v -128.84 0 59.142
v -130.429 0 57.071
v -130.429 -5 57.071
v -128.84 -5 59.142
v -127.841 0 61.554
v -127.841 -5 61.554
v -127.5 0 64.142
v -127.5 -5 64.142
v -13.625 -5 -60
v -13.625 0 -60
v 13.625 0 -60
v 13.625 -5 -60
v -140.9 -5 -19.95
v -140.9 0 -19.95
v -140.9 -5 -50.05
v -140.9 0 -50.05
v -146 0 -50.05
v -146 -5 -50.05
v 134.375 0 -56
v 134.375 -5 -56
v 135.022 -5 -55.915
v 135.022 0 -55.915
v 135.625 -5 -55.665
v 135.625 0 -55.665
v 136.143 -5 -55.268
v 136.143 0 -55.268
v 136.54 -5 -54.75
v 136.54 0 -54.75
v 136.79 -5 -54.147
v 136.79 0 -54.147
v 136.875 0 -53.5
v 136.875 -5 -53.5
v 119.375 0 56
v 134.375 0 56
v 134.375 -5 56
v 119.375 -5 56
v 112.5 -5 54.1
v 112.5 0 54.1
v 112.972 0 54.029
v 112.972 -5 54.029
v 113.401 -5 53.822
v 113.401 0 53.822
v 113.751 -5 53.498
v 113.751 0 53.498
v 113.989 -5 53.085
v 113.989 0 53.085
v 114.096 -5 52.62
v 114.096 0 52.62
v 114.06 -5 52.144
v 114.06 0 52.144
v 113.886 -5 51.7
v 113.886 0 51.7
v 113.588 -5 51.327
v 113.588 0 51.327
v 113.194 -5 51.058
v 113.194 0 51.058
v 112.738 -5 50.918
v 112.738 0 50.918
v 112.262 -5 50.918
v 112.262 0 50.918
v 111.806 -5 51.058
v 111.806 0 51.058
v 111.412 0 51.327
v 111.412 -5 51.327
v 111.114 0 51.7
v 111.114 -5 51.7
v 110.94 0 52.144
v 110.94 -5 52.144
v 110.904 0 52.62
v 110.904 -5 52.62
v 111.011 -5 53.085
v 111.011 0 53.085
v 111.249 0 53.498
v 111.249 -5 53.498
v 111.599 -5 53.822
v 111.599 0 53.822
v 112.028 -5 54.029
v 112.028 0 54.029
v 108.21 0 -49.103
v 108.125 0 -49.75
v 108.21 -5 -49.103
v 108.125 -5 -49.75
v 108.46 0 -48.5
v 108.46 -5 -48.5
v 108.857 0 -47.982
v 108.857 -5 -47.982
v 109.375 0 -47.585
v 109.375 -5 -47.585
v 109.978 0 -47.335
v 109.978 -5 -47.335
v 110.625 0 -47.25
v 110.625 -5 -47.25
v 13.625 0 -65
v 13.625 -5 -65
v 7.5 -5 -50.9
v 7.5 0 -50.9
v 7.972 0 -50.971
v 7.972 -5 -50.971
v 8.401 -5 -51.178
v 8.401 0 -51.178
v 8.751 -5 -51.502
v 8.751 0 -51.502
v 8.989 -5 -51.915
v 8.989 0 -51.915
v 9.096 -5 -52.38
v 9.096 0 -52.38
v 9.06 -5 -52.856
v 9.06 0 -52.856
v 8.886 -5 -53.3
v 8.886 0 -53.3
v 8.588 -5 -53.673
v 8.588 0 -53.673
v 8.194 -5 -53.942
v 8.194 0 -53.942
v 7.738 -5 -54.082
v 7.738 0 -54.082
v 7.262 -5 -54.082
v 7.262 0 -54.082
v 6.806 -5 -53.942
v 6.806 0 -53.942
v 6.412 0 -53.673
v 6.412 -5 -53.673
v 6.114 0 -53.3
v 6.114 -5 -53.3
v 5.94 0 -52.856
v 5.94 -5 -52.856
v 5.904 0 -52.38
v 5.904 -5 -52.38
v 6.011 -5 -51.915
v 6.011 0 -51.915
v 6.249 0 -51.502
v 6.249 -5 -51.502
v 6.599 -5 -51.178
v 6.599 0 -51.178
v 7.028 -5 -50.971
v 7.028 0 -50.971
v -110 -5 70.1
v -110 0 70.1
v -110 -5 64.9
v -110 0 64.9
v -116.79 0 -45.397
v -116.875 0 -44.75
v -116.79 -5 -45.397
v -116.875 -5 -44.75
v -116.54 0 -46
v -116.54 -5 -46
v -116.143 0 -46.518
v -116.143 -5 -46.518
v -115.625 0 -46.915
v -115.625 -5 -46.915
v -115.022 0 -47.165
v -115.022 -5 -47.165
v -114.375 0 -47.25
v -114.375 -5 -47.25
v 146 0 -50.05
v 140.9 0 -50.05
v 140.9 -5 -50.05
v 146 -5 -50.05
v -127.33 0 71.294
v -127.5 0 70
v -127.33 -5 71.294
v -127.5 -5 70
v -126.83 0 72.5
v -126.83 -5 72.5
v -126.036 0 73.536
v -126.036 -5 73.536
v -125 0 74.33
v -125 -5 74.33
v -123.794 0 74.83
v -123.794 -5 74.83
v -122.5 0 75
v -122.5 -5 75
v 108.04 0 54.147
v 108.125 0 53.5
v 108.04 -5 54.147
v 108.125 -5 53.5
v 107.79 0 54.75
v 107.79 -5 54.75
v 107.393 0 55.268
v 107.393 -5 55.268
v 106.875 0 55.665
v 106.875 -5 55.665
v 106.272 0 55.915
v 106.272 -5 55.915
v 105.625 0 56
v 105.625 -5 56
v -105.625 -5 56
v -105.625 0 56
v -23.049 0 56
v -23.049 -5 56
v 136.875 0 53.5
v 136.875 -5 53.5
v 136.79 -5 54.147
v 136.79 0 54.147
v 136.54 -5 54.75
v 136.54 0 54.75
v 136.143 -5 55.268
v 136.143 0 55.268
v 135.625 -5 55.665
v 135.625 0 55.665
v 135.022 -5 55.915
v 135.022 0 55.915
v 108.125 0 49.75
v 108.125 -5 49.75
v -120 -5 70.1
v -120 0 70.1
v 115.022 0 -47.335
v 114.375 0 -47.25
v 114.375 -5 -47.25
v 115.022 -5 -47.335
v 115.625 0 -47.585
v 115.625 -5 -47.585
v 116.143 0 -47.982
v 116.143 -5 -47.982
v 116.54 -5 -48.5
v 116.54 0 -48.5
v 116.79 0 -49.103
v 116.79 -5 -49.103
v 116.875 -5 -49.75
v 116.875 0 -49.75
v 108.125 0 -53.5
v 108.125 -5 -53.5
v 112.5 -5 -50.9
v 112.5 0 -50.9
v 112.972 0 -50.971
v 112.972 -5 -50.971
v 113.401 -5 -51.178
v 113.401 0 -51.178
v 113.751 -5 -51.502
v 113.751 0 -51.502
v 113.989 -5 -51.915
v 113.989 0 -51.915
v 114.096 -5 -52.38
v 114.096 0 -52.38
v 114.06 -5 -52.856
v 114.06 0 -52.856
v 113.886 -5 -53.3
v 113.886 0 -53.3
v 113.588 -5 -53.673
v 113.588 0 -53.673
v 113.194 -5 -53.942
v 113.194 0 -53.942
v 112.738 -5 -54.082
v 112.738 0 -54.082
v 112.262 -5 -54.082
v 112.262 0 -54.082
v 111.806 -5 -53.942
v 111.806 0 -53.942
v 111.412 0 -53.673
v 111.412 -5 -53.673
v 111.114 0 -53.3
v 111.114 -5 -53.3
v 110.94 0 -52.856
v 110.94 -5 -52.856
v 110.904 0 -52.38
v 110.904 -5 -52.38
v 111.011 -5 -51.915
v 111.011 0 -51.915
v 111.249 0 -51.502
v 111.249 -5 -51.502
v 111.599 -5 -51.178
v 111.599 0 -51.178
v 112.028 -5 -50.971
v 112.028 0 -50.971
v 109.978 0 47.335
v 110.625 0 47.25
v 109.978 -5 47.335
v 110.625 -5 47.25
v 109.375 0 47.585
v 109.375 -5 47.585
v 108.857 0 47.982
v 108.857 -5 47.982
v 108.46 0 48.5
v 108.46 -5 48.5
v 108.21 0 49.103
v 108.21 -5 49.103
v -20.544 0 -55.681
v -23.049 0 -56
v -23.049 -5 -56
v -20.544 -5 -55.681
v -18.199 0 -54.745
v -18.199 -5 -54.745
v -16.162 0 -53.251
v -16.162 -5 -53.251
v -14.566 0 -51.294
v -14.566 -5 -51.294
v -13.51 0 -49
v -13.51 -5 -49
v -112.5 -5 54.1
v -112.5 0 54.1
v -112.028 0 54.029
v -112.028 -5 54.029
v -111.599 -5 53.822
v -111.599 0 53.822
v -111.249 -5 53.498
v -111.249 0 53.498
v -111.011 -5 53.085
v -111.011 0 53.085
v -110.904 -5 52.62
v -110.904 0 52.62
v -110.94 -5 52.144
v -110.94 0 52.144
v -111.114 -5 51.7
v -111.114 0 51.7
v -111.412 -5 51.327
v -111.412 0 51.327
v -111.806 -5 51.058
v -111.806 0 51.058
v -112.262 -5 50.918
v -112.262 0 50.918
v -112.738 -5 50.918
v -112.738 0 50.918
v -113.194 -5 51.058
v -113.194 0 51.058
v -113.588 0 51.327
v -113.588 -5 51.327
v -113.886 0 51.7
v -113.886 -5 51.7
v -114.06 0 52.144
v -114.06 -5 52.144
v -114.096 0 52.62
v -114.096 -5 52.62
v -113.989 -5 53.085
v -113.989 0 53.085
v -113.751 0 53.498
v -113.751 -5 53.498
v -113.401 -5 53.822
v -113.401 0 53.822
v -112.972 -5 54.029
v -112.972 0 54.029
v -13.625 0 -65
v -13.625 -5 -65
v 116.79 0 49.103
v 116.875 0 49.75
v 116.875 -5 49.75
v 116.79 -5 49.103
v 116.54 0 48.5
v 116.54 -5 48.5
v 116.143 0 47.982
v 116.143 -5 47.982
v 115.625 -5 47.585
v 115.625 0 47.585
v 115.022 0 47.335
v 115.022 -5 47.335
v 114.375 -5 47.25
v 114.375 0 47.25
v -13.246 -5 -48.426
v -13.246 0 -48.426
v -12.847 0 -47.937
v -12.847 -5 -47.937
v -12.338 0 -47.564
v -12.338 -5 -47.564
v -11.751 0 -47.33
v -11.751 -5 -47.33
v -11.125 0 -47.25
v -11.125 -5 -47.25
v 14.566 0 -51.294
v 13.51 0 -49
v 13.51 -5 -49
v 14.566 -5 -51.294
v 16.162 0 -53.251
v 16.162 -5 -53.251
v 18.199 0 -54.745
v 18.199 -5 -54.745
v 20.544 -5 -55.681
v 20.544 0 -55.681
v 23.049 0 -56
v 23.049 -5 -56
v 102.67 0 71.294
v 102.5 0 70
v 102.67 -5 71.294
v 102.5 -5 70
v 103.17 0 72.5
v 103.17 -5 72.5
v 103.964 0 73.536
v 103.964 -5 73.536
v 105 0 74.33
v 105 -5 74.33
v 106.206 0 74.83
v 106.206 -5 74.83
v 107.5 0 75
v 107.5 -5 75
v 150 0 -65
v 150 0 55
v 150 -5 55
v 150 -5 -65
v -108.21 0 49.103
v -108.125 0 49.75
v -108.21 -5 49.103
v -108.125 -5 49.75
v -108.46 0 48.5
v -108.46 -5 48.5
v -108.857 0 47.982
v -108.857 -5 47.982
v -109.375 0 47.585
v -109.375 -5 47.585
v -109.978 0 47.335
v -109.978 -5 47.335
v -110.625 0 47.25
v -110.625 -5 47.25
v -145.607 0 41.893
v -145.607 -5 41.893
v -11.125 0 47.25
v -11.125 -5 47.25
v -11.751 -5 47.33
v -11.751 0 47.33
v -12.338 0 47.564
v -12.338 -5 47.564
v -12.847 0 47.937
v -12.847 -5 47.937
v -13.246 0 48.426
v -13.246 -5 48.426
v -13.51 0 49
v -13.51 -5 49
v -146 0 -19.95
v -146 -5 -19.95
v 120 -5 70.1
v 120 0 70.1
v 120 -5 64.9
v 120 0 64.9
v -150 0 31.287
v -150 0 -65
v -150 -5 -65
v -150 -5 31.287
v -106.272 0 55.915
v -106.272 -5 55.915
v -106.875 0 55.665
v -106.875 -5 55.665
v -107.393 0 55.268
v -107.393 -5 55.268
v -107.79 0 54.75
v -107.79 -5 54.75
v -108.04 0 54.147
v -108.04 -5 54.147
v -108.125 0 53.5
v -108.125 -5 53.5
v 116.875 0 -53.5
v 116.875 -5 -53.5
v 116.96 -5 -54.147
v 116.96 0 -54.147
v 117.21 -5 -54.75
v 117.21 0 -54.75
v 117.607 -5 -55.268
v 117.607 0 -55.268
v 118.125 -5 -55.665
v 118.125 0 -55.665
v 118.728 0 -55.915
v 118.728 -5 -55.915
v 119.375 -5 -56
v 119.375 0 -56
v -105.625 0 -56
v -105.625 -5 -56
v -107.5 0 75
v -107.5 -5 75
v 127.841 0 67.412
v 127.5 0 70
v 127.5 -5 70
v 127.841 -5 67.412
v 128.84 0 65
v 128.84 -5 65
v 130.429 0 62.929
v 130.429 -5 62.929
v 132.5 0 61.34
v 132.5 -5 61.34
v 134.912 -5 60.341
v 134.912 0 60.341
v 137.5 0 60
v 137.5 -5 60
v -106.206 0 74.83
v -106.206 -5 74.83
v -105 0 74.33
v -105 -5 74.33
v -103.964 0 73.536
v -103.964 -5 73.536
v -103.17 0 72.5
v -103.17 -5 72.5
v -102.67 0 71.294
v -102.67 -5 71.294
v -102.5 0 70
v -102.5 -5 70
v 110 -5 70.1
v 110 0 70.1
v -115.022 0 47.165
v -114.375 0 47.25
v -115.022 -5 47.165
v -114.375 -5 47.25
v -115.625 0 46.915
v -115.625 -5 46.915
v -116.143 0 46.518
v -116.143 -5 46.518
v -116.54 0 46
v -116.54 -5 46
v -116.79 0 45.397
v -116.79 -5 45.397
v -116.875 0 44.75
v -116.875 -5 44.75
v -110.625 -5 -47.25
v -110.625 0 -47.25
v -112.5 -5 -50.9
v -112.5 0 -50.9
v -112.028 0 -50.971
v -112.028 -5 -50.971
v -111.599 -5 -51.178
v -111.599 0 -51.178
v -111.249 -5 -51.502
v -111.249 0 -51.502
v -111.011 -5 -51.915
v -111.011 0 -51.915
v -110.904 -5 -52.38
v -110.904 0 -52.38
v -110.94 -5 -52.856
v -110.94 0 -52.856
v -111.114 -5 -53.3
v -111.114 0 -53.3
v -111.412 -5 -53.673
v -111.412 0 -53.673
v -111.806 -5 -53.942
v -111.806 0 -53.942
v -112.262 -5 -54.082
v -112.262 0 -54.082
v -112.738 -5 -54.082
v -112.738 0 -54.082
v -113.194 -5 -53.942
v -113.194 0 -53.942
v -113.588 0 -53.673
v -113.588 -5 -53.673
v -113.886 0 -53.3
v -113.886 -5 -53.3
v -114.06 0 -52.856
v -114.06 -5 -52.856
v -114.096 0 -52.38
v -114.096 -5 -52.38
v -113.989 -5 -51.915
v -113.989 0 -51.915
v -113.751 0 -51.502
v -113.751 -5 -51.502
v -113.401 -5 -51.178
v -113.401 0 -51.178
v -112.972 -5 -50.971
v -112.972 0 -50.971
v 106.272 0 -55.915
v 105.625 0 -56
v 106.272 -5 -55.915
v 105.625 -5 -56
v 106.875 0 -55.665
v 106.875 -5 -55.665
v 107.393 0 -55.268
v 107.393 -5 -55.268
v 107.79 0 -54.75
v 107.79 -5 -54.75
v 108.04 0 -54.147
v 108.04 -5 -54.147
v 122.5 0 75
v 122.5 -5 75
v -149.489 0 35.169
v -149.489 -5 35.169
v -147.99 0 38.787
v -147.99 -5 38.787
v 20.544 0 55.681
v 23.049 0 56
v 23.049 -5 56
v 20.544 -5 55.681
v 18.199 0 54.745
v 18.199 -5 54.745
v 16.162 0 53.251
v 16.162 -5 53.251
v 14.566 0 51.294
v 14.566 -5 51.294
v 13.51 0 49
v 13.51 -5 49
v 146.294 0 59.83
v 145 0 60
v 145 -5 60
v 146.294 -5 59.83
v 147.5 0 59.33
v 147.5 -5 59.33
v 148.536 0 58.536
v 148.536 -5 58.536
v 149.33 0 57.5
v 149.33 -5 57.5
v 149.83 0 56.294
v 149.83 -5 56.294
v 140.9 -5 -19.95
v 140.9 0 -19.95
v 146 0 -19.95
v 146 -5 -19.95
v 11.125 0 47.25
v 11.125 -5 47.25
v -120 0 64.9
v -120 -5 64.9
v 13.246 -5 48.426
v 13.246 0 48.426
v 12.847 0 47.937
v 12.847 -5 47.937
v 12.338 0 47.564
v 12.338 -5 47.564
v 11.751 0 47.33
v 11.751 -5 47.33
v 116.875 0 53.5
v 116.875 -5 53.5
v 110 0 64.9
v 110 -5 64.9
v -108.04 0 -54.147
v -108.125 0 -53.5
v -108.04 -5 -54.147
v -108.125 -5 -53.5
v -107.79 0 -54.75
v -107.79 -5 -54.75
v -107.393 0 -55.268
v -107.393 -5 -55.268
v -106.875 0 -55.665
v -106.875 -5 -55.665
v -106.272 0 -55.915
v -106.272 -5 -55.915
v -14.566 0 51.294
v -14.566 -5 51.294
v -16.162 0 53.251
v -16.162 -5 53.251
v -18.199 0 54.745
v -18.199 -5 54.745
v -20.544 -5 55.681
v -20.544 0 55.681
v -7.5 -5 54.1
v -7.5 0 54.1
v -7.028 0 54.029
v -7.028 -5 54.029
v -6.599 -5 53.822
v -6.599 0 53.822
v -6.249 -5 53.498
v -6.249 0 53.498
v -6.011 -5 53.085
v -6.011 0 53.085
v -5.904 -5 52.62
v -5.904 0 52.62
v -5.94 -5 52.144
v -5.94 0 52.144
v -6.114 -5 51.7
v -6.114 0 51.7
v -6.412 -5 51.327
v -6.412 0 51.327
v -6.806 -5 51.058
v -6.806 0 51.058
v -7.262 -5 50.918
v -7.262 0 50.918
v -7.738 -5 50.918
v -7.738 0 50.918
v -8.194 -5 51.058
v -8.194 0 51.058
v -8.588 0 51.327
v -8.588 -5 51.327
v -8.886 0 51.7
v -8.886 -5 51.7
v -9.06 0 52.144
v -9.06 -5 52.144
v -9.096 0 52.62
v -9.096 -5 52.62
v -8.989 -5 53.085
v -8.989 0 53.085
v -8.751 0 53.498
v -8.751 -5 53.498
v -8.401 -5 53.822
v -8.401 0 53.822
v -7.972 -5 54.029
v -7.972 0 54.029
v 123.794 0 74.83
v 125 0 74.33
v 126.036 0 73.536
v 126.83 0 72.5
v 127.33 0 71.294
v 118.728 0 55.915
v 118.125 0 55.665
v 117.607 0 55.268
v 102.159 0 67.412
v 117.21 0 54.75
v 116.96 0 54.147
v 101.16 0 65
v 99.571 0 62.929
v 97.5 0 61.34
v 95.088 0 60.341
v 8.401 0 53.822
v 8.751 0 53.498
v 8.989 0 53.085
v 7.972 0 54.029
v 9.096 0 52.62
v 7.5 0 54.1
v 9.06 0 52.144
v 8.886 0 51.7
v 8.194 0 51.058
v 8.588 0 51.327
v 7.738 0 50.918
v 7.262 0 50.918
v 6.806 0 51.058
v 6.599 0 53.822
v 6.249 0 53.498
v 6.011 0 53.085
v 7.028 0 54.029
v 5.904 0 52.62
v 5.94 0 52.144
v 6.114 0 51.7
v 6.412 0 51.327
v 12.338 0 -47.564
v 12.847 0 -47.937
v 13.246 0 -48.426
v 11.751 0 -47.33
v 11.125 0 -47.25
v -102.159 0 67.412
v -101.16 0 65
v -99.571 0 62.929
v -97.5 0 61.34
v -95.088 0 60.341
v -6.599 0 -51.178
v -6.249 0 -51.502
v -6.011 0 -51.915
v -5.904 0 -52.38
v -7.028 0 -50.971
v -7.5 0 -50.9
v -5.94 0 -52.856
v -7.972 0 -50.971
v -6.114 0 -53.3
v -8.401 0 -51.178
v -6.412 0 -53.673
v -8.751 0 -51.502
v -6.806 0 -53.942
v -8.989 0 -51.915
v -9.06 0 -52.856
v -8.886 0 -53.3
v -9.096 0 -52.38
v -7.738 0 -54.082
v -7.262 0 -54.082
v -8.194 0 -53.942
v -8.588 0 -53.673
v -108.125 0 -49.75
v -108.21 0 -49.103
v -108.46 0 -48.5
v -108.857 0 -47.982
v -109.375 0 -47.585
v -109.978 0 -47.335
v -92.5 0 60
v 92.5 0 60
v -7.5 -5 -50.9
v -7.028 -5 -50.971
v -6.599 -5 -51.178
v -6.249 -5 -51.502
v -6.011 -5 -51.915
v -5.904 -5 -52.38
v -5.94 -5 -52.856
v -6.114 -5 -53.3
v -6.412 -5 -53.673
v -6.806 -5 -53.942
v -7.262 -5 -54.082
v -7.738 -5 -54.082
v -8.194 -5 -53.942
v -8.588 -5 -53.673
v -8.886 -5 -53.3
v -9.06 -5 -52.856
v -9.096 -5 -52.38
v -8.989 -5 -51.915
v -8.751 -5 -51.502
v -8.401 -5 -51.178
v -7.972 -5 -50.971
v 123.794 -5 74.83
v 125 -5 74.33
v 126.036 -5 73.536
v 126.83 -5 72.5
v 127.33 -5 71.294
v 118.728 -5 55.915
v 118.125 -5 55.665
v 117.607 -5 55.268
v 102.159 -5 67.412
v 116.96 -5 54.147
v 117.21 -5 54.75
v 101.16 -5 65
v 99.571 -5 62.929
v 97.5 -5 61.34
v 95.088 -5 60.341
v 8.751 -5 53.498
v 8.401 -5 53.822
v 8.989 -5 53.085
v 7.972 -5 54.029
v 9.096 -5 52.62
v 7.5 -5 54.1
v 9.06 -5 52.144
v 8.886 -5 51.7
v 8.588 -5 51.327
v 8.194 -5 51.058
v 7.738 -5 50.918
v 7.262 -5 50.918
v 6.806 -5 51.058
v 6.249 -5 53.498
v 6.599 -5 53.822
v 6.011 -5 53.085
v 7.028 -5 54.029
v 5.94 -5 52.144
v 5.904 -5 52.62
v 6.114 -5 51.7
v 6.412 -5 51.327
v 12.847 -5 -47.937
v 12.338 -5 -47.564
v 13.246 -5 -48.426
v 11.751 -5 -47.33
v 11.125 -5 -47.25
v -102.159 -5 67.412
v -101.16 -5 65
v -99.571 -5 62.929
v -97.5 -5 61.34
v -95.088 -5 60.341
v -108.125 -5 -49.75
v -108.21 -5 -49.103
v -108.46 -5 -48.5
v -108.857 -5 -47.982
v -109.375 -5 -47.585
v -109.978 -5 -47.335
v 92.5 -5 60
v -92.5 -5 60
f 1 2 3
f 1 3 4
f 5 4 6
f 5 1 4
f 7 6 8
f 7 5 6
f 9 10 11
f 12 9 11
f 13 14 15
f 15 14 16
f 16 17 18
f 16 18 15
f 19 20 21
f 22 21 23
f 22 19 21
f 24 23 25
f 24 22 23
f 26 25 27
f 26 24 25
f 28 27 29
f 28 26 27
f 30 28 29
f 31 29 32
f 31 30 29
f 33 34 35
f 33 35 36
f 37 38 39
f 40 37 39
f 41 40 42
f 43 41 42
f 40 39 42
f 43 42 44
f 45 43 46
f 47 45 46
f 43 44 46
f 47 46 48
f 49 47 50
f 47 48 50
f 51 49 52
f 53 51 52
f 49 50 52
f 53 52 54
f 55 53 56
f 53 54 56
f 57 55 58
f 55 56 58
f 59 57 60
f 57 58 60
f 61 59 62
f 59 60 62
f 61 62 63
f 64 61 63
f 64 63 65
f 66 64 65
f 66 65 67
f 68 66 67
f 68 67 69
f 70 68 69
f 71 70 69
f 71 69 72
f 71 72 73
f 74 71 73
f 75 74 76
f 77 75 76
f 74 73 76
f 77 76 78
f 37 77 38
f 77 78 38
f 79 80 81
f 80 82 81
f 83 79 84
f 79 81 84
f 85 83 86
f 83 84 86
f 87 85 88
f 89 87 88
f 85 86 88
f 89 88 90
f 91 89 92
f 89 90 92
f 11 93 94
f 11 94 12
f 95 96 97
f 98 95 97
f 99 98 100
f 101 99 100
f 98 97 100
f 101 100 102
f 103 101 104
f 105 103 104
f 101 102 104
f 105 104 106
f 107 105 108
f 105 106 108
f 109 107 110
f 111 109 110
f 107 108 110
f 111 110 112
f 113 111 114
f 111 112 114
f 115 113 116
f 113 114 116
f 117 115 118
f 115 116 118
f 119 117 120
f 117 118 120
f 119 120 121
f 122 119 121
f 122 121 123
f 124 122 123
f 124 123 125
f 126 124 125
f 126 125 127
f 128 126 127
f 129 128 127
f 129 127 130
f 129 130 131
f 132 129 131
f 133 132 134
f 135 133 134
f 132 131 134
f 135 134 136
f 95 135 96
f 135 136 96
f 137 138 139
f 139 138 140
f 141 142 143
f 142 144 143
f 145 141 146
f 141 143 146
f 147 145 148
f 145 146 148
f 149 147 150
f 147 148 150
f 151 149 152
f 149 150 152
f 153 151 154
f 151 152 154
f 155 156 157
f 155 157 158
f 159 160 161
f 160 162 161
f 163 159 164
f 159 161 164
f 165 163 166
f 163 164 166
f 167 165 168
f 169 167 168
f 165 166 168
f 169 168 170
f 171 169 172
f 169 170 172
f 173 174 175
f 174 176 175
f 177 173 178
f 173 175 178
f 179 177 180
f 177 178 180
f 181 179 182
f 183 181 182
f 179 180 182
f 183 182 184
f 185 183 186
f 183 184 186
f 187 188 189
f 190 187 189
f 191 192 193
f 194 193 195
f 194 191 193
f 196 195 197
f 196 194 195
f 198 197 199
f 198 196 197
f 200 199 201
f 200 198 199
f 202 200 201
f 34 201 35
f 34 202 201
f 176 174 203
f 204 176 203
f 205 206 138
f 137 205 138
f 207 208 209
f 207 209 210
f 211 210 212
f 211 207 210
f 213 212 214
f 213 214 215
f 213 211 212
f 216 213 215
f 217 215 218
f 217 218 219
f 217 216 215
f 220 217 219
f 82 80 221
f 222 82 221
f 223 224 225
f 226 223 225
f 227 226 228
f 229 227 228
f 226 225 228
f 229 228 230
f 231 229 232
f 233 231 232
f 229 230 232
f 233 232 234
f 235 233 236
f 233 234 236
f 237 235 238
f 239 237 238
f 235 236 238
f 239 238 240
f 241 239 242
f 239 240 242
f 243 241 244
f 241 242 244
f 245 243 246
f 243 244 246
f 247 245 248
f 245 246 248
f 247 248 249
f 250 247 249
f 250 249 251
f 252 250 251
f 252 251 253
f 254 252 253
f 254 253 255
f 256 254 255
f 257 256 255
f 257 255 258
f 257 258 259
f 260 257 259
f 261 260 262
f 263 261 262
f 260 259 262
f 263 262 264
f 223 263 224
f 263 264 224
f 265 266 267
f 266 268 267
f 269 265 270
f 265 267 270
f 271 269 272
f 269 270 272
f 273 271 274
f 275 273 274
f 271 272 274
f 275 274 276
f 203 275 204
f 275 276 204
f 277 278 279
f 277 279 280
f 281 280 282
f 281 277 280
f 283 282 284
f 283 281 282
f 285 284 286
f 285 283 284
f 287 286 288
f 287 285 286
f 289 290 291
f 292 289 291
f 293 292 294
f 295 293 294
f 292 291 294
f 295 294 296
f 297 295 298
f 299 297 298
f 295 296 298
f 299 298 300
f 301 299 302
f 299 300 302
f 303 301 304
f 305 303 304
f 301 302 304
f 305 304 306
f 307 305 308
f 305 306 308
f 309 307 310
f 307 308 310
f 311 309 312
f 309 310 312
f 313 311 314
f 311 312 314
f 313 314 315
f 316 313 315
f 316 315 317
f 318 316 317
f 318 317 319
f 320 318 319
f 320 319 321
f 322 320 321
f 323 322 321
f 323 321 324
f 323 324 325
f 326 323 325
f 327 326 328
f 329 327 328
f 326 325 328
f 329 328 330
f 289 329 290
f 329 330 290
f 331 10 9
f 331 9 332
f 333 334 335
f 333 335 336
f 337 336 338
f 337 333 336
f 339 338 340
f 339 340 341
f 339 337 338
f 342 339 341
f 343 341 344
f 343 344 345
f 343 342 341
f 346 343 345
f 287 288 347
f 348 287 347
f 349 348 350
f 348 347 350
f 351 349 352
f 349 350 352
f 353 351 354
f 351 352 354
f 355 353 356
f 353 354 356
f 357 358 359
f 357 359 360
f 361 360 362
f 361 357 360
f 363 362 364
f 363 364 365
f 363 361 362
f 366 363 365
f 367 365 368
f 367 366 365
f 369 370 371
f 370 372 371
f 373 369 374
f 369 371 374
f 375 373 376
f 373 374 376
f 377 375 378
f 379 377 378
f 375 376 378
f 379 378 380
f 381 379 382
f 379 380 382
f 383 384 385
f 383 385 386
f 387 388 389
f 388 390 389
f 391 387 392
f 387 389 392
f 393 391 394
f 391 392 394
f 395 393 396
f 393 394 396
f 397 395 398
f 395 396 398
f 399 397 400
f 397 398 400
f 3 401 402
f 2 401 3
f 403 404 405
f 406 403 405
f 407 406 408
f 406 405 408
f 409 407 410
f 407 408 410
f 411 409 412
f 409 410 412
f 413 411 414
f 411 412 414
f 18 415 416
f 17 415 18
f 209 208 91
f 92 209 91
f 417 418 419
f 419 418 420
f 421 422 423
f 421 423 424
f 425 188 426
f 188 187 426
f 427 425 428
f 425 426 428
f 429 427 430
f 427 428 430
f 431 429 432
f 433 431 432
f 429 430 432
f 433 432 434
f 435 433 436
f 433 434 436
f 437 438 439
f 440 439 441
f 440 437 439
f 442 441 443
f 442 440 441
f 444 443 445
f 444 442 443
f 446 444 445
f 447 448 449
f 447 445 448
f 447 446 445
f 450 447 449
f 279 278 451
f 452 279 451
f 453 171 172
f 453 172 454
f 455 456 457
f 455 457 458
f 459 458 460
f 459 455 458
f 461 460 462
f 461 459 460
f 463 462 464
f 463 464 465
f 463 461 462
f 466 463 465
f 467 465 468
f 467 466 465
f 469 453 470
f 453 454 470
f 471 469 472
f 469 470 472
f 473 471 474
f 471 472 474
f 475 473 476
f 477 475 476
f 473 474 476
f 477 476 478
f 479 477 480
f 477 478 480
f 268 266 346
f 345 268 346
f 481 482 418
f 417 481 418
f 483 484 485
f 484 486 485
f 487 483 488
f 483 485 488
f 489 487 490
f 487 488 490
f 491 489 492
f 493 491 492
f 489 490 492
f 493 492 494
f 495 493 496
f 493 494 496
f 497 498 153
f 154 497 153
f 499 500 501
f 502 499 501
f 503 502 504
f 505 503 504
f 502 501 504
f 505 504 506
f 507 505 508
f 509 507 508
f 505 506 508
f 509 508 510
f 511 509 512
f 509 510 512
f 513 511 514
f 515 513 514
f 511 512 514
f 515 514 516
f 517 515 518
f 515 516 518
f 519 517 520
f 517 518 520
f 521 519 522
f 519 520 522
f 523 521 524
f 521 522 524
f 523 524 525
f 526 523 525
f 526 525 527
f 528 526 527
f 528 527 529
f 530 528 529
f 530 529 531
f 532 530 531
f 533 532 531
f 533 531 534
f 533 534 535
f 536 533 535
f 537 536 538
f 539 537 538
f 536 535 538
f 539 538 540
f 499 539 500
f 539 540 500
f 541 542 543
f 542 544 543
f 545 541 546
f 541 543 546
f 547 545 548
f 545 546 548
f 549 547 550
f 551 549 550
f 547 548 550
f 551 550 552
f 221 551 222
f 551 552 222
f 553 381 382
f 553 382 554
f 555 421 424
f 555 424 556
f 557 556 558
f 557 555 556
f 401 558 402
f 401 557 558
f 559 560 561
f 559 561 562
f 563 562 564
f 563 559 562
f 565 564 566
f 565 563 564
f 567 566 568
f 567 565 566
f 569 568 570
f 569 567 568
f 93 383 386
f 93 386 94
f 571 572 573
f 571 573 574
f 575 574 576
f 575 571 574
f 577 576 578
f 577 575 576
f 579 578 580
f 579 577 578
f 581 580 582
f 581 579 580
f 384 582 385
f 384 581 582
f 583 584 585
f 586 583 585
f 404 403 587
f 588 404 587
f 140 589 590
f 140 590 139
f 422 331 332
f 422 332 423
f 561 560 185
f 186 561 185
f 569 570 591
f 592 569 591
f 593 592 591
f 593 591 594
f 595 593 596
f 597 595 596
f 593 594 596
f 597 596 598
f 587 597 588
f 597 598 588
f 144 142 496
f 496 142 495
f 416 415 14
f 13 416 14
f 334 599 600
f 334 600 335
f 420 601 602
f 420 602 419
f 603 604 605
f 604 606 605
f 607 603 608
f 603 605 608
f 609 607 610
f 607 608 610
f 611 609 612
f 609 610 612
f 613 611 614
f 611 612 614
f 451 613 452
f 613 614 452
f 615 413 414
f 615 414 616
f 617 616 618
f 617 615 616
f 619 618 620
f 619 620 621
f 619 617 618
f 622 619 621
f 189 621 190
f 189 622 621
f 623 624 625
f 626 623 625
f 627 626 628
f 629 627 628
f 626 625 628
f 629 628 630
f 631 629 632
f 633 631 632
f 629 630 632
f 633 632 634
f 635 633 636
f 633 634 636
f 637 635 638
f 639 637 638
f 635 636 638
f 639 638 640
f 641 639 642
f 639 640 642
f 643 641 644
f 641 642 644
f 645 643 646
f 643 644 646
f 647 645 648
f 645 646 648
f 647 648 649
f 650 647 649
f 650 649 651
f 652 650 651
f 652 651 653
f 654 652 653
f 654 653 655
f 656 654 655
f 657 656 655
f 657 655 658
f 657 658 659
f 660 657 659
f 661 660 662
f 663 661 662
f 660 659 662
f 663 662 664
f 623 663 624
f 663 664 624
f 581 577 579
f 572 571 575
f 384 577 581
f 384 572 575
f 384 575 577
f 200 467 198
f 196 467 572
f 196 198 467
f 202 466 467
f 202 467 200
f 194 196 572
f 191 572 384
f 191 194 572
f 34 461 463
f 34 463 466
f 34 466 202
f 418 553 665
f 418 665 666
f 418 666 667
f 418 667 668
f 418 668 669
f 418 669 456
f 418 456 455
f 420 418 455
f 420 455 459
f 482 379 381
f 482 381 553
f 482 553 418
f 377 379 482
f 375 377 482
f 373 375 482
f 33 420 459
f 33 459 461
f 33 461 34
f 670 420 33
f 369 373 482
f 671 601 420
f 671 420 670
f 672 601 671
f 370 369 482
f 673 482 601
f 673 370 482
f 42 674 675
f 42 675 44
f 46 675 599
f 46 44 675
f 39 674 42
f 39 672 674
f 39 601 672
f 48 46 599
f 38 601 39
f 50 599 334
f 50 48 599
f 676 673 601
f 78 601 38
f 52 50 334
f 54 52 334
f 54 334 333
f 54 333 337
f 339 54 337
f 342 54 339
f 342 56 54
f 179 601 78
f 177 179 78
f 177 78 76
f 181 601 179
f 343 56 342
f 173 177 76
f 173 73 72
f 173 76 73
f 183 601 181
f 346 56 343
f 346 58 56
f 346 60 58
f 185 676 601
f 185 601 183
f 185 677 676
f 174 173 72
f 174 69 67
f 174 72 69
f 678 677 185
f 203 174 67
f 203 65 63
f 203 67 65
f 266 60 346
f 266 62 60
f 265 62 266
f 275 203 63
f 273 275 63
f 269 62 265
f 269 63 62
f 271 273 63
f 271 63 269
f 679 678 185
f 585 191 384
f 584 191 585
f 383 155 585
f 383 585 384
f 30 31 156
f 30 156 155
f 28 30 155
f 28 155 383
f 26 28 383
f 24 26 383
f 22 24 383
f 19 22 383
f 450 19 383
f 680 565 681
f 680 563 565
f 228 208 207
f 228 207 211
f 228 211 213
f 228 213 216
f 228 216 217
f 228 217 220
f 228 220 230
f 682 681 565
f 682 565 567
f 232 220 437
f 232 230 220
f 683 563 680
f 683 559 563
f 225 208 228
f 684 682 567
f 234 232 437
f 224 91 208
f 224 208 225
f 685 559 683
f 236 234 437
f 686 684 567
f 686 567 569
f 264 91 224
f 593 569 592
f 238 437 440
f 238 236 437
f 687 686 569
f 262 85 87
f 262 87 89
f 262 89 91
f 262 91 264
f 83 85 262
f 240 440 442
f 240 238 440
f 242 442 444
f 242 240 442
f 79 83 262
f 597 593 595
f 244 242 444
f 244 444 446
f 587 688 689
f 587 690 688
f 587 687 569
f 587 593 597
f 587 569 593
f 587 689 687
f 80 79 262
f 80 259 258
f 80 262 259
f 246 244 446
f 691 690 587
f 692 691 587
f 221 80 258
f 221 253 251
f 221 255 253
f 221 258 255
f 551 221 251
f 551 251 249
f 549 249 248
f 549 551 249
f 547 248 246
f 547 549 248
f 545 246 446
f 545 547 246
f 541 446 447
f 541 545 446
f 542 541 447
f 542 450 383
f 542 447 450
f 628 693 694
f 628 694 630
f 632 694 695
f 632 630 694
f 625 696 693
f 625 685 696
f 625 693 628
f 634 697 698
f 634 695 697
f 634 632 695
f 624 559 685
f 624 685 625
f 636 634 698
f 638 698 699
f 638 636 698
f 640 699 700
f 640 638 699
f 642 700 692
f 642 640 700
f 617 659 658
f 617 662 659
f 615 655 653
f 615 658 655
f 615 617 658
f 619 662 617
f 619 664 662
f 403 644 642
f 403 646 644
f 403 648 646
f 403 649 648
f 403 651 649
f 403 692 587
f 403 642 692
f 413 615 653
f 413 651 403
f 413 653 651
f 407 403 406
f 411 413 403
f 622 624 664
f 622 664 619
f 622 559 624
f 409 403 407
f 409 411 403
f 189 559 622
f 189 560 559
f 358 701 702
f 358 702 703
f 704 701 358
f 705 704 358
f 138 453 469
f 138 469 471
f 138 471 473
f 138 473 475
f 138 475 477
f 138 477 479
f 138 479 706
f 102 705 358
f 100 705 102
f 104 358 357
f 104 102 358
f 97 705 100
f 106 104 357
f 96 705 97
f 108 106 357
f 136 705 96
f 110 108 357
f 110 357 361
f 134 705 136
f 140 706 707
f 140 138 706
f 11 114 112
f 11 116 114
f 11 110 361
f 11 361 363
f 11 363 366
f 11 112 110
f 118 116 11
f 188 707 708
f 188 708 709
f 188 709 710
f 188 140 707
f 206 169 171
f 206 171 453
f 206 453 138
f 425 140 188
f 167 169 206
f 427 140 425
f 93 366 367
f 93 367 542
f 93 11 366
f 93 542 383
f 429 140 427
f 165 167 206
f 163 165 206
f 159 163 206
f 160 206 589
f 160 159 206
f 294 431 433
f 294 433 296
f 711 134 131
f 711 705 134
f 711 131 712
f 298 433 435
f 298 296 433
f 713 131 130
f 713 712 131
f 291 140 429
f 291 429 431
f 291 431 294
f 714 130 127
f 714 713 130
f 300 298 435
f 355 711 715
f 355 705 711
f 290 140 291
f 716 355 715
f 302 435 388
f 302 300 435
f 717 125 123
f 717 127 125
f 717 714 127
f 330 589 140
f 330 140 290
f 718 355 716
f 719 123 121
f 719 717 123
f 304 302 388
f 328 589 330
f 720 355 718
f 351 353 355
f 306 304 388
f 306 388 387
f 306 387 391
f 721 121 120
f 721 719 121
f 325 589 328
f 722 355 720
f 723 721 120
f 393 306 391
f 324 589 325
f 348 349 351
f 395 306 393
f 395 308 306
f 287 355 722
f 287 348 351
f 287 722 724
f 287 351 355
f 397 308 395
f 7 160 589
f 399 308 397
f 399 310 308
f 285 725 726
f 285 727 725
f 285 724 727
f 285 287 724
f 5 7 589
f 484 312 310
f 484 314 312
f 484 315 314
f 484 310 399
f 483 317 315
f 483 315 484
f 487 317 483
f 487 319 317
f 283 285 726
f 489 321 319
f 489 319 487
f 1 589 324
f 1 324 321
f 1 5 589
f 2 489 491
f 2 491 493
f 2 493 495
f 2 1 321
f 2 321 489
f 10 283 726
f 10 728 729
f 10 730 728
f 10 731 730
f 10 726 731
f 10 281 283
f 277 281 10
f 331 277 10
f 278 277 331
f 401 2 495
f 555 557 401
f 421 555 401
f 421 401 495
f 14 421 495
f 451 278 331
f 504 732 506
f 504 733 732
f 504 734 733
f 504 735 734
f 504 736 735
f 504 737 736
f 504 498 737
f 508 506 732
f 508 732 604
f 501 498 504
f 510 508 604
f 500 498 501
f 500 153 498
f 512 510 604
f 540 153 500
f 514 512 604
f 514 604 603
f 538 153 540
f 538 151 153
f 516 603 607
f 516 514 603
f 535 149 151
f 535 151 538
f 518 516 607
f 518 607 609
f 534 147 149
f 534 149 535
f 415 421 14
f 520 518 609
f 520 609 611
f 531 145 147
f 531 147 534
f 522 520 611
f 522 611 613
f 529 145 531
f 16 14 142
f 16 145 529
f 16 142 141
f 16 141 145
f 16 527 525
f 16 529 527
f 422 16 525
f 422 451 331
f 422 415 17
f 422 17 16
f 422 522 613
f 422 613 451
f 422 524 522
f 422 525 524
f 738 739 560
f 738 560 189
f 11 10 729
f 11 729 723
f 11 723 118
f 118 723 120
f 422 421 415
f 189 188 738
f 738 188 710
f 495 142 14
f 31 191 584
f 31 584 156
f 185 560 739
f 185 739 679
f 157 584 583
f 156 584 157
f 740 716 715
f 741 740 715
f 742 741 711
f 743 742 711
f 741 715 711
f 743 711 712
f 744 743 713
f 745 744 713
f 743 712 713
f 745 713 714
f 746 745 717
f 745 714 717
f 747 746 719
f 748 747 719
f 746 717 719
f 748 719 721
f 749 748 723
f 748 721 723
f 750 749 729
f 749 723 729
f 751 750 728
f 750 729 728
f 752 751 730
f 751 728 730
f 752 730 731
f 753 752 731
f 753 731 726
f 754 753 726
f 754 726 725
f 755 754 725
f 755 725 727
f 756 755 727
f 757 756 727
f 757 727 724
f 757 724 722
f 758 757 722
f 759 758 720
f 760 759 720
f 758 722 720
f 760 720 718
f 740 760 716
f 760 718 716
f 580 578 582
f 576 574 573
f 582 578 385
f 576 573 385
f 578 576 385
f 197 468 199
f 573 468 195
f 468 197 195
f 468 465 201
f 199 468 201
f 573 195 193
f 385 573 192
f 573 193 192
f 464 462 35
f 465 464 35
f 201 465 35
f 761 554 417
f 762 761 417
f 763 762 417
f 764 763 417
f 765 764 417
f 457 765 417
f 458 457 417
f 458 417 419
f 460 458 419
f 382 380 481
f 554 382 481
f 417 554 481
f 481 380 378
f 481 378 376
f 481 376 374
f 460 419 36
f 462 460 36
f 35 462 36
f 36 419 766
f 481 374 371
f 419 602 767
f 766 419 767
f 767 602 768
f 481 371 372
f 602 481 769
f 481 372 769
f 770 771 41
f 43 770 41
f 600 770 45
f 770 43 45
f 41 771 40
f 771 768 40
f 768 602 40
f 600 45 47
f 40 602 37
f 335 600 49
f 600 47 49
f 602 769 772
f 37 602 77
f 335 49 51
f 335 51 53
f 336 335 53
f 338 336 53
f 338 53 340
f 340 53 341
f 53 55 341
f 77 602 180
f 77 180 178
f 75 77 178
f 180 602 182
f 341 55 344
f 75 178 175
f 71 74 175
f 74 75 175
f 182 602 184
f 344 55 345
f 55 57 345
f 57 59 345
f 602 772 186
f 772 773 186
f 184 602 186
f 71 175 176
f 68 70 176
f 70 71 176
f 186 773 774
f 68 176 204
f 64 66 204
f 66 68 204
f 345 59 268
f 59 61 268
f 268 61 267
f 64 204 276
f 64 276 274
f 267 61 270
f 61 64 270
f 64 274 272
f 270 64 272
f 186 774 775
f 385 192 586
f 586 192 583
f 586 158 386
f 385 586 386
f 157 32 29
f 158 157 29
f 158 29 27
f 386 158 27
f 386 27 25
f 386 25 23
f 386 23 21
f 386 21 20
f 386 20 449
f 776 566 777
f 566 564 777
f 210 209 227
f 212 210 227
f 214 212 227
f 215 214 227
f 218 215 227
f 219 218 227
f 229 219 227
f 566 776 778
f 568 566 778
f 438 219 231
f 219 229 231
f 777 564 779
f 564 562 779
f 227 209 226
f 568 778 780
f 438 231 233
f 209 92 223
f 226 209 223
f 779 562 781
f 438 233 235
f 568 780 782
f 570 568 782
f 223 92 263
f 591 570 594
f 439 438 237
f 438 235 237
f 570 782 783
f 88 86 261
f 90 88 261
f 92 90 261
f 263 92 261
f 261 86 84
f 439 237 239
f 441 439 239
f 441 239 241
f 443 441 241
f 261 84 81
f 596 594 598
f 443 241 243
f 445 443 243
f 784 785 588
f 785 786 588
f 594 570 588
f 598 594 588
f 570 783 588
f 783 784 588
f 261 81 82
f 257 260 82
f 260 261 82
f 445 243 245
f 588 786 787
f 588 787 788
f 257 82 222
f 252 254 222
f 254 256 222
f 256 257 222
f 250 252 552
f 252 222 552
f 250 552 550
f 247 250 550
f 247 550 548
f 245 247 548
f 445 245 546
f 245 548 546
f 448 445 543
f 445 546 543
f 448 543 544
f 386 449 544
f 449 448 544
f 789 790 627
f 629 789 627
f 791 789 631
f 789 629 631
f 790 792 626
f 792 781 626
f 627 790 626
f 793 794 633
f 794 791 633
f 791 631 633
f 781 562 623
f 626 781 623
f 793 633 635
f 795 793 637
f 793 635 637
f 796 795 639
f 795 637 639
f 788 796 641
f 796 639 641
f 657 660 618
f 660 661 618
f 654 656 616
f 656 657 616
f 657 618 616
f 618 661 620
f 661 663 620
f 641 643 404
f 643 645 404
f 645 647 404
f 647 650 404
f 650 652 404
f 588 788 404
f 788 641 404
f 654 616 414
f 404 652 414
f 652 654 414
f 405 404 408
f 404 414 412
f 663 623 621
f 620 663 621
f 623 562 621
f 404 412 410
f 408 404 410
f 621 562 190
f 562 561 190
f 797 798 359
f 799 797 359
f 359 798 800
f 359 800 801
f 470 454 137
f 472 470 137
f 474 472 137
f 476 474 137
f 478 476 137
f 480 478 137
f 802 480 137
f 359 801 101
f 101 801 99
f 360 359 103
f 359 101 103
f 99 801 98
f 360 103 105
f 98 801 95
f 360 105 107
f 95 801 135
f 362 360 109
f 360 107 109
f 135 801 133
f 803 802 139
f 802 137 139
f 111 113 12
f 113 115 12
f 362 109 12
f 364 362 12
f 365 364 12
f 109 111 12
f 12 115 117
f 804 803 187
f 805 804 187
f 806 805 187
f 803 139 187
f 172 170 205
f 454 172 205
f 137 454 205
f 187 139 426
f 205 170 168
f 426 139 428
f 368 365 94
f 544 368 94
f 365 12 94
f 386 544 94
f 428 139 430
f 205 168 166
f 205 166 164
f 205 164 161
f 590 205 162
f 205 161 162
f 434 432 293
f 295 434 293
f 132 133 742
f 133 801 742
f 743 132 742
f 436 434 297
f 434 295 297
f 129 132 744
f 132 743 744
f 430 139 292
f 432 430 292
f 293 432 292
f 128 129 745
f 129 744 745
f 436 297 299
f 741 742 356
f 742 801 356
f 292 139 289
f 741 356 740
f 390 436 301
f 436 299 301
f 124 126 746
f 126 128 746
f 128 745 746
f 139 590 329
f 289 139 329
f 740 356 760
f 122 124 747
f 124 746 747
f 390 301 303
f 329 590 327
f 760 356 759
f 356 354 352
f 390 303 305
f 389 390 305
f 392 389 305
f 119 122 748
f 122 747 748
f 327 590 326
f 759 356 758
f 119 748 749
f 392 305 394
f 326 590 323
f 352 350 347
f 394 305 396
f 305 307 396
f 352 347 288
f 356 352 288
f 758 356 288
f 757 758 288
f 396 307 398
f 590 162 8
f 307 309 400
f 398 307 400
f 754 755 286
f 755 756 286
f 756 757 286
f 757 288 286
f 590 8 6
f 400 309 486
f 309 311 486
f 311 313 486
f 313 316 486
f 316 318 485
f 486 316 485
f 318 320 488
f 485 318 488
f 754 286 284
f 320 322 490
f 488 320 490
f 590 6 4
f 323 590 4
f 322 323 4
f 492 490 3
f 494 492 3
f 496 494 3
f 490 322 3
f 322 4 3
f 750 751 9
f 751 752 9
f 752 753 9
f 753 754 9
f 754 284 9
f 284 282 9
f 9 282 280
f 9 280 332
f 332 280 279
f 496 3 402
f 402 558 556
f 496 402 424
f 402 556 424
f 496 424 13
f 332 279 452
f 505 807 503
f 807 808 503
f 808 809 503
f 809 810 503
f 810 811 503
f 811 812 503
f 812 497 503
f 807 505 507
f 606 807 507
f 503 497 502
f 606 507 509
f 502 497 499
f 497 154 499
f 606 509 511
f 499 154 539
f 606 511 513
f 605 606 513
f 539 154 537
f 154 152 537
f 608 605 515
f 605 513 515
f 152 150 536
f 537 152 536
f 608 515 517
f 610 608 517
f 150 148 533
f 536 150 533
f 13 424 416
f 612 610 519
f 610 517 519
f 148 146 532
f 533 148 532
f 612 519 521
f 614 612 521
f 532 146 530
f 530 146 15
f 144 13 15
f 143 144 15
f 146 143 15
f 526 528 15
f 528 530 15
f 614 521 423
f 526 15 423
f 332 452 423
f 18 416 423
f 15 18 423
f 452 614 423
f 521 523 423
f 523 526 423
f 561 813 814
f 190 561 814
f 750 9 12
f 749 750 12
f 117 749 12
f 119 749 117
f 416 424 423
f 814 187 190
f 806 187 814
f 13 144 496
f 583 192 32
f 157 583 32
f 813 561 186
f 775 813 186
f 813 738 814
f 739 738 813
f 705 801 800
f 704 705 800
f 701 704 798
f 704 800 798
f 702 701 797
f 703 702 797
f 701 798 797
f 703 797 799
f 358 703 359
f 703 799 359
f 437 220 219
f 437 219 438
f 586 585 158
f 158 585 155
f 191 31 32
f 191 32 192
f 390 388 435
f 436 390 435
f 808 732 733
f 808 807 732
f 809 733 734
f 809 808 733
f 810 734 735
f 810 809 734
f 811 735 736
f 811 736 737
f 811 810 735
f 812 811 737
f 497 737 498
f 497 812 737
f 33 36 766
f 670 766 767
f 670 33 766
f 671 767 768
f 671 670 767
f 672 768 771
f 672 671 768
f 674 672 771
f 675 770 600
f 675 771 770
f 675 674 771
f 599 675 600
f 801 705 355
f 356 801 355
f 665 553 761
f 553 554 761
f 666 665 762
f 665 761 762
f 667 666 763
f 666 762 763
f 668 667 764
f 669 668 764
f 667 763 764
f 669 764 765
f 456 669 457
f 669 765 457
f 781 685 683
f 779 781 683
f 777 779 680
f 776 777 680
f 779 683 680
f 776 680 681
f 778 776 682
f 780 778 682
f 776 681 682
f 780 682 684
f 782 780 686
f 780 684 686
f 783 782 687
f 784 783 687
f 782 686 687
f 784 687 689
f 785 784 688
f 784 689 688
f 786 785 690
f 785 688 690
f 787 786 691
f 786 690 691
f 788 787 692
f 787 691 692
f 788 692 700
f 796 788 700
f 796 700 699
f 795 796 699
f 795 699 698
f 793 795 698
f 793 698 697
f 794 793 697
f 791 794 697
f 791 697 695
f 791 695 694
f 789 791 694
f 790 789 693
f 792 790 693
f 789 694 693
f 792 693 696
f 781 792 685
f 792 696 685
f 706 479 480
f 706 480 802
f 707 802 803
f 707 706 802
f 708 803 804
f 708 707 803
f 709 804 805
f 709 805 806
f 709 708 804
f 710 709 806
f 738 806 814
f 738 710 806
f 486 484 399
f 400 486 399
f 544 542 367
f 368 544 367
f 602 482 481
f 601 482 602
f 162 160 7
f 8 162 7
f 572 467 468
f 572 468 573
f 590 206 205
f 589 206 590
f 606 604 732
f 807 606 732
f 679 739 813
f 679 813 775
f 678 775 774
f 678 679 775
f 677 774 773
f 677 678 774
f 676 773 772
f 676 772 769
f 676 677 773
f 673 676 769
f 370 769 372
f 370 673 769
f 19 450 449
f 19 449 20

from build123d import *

# Parameters (mm, degrees)
SKETCH1_W           = 255
SKETCH1_H           = 120
SKETCH1_R           = 1.6
BASE_FLANGE1_DEPTH  = 5
CUT_EXTRUDE1_REACH  = 143.001
SKETCH9_W           = 5.1
SKETCH9_H           = 30.1
BOSS_EXTRUDE1_DEPTH = 5
SKETCH10_W          = 25
SKETCH10_H          = 15
SKETCH10_W_2        = 10
SKETCH10_H_2        = 5.2
BOSS_EXTRUDE2_DEPTH = 5
FILLET1_R           = 5
FILLET2_R           = 2.5
FILLET3_R           = 10
CUT_EXTRUDE2_DEPTH  = 168.779617356


# Sheet-metal steps are written as plain solids
with BuildPart() as part:
    # Sketch1 → Base-Flange1 (new body)
    with BuildSketch(Plane(origin=(0, 0, 0), x_dir=(1, 0, 0), z_dir=(0, 1, 0))):
        Rectangle(SKETCH1_W, SKETCH1_H)
        with Locations(Location((-112.5, 52.5, 0), (0, 0, 270))):
            Circle(SKETCH1_R, mode=Mode.SUBTRACT)
        with Locations(Location((-112.5, -52.5, 0), (0, 0, 270))):
            Circle(SKETCH1_R, mode=Mode.SUBTRACT)
        with Locations(Location((-7.5, -52.5, 0), (0, 0, 270))):
            Circle(SKETCH1_R, mode=Mode.SUBTRACT)
        with Locations(Location((-7.5, 52.5, 0), (0, 0, 270))):
            Circle(SKETCH1_R, mode=Mode.SUBTRACT)
        with Locations(Location((7.5, 52.5, 0), (0, 0, 270))):
            Circle(SKETCH1_R, mode=Mode.SUBTRACT)
        with Locations(Location((112.5, 52.5, 0), (0, 0, 270))):
            Circle(SKETCH1_R, mode=Mode.SUBTRACT)
        with Locations(Location((112.5, -52.5, 0), (0, 0, 270))):
            Circle(SKETCH1_R, mode=Mode.SUBTRACT)
        with Locations(Location((7.5, -52.5, 0), (0, 0, 270))):
            Circle(SKETCH1_R, mode=Mode.SUBTRACT)
    extrude(amount=-BASE_FLANGE1_DEPTH)

    # Sketch6 → Cut-Extrude1 (cut, up to next)
    with BuildSketch(Plane(origin=(0, 0, 0), x_dir=(1, 0, 0), z_dir=(0, 1, 0)), mode=Mode.PRIVATE) as cut_extrude1_sk1:
        Polygon((-108.125, 56), (-108.125, 47.25), (-116.875, 47.25), (-116.875, -47.25), (-108.125, -47.25), (-108.125, -56), (-13.625, -56), (-13.625, -47.25), (13.625, -47.25), (13.625, -56), (108.125, -56), (108.125, -47.25), (116.875, -47.25), (116.875, 47.25), (108.125, 47.25), (108.125, 56), (13.625, 56), (13.625, 47.25), (-13.625, 47.25), (-13.625, 56), align=None)
    cut_extrude1_tool1 = extrude(cut_extrude1_sk1.sketch, amount=-CUT_EXTRUDE1_REACH, mode=Mode.PRIVATE) & part.part
    add(cut_extrude1_tool1.solids().sort_by_distance((0, 0, 0))[0], mode=Mode.SUBTRACT)

    # Sketch9 → Boss-Extrude1 (add)
    # profile 1 of 2: a face of its own
    with BuildSketch(Plane(origin=(0, 0, 0), x_dir=(1, 0, 0), z_dir=(0, 1, 0))):
        with BuildLine():
            Line((-150, 60), (-150, -31.286796564))
            ThreePointArc((-150, -31.286796564), (-148.858192988, -37.02704805), (-145.606601718, -41.893398282))
            Line((-145.606601718, -41.893398282), (-127.5, -60))
            Line((-127.5, -60), (-127.5, 60))
            Line((-127.5, 60), (-13.625, 60))
            Line((-13.625, 60), (-13.625, 65))
            Line((-13.625, 65), (-150, 65))
            Line((-150, 65), (-150, 60))
        make_face()
        with Locations((-143.45, 35)):
            Rectangle(SKETCH9_W, SKETCH9_H, mode=Mode.SUBTRACT)
    # profile 2 of 2: a face of its own
    with BuildSketch(Plane(origin=(0, 0, 0), x_dir=(1, 0, 0), z_dir=(0, 1, 0))):
        with BuildLine():
            Line((127.5, 60), (127.5, -60))
            Line((127.5, -60), (145, -60))
            ThreePointArc((145, -60), (148.535533906, -58.535533906), (150, -55))
            Line((150, -55), (150, 60))
            Line((150, 60), (150, 65))
            Line((150, 65), (13.625, 65))
            Line((13.625, 65), (13.625, 60))
            Line((13.625, 60), (127.5, 60))
        make_face()
        with Locations((143.45, 35)):
            Rectangle(SKETCH9_W, SKETCH9_H, mode=Mode.SUBTRACT)
    extrude(amount=-BOSS_EXTRUDE1_DEPTH)

    # Sketch10 → Boss-Extrude2 (add)
    # profile 1 of 2: a face of its own
    with BuildSketch(Plane(origin=(0, 0, 0), x_dir=(1, 0, 0), z_dir=(0, 1, 0))):
        with Locations((115, -67.5)):
            Rectangle(SKETCH10_W, SKETCH10_H)
        with Locations((115, -67.5)):
            Rectangle(SKETCH10_W_2, SKETCH10_H_2, mode=Mode.SUBTRACT)
    # profile 2 of 2: a face of its own
    with BuildSketch(Plane(origin=(0, 0, 0), x_dir=(1, 0, 0), z_dir=(0, 1, 0))):
        with Locations((-115, -67.5)):
            Rectangle(SKETCH10_W, SKETCH10_H)
        with Locations((-115, -67.5)):
            Rectangle(SKETCH10_W_2, SKETCH10_H_2, mode=Mode.SUBTRACT)
    extrude(amount=-BOSS_EXTRUDE2_DEPTH)

    # Fillet1
    fillet1_edges = [part.edges().sort_by_distance(p)[0] for p in [
        (102.5, -2.5, 75),
        (127.5, -2.5, 75),
        (-127.5, -2.5, 75),
        (-102.5, -2.5, 75),
    ]]
    fillet(fillet1_edges, radius=FILLET1_R)

    # Fillet2
    fillet2_edges = [part.edges().sort_by_distance(p)[0] for p in [
        (-108.125, -2.5, -56),
        (-13.625, -2.5, -47.25),
        (13.625, -2.5, -47.25),
        (108.125, -2.5, -56),
        (108.125, -2.5, -47.25),
        (116.875, -2.5, -47.25),
        (116.875, -2.5, 47.25),
        (108.125, -2.5, 47.25),
        (108.125, -2.5, 56),
        (13.625, -2.5, 47.25),
        (-13.625, -2.5, 47.25),
        (-108.125, -2.5, 56),
        (-108.125, -2.5, 47.25),
        (-116.875, -2.5, 47.25),
        (-116.875, -2.5, -47.25),
        (-108.125, -2.5, -47.25),
    ]]
    fillet(fillet2_edges, radius=FILLET2_R)

    # Fillet3
    # the kernel refuses this fillet: 10 mm, written as the material it adds along each edge
    with BuildSketch(Plane(origin=(127.5, 0, 60), x_dir=(0, 0, 1), z_dir=(0, -1, 0))) as fillet3_piece_1:
        with BuildLine():
            CenterArc((FILLET3_R, -FILLET3_R), FILLET3_R, 90, 90)
            Line((0, -FILLET3_R), (0, 0))
            Line((0, 0), (FILLET3_R, 0))
        make_face()
    extrude(amount=5)
    with BuildSketch(Plane(origin=(102.5, 0, 60), x_dir=(0, 0, 1), z_dir=(0, -1, 0)), Plane(origin=(-102.5, 0, 60), x_dir=(1, 0, 0), z_dir=(0, -1, 0))) as fillet3_piece_2:
        with BuildLine():
            CenterArc((FILLET3_R, FILLET3_R), FILLET3_R, 180, 90)
            Line((0, FILLET3_R), (0, 0))
            Line((0, 0), (FILLET3_R, 0))
        make_face()
    extrude(amount=5)
    with BuildSketch(Plane(origin=(-13.625, 0, -56), x_dir=(-1, 0, 0), z_dir=(0, -1, 0))) as fillet3_piece_3:
        with BuildLine():
            CenterArc((9.424240018, -10), FILLET3_R, 90, 72.542396876)
            Line((-0.115151996, -7), (-1.069091198, -6.7))
            ThreePointArc((-1.069091198, -6.7), (-1, -6.25), (-1, 0))
            Line((-1, 0), (0, 1))
            Line((0, 1), (9.424240018, 1))
            Line((9.424240018, 1), (9.424240018, 0))
        make_face()
    extrude(amount=5)
    with BuildSketch(Plane(origin=(13.625, 0, -56), x_dir=(-0.01644805983855046, 0, 0.9998647215136394), z_dir=(0, -1, 0))) as fillet3_piece_4:
        with BuildLine():
            CenterArc((9.843636751, -9.587445719), FILLET3_R, 106.515156216, 72.542396876)
            Line((-0.155010464, -9.422965121), (-1.154875185, -9.406517061))
            Line((-1.154875185, -9.406517061), (-0.999864722, 0.01644806))
            Line((-0.999864722, 0.01644806), (0.01644806, 0.999864722))
            ThreePointArc((0.01644806, 0.999864722), (6.265602569, 0.897064348), (6.71667811, 0.958744572))
            Line((6.71667811, 0.958744572), (7.000947078, 0))
        make_face()
    extrude(amount=5)
    with BuildSketch(Plane(origin=(13.625, 0, 56), x_dir=(-0.01644805983855046, 0, -0.9998647215136394), z_dir=(0, -1, 0))) as fillet3_piece_5:
        with BuildLine():
            CenterArc((9.843636751, 9.587445719), FILLET3_R, 180.942446908, 72.542396876)
            Line((-0.155010464, 9.422965121), (-1.154875185, 9.406517061))
            Line((-1.154875185, 9.406517061), (-0.999864722, -0.01644806))
            Line((-0.999864722, -0.01644806), (0.01644806, -0.999864722))
            ThreePointArc((0.01644806, -0.999864722), (6.265602569, -0.897064348), (6.71667811, -0.958744572))
            Line((6.71667811, -0.958744572), (7.000947078, 0))
        make_face()
    extrude(amount=5)
    with BuildSketch(Plane(origin=(-13.625, 0, 56), x_dir=(-1, 0, 0), z_dir=(0, -1, 0))) as fillet3_piece_6:
        with BuildLine():
            CenterArc((9.424240018, 10), FILLET3_R, 197.457603124, 72.542396876)
            Line((-0.115151996, 7), (-1.069091198, 6.7))
            ThreePointArc((-1.069091198, 6.7), (-1, 6.25), (-1, 0))
            Line((-1, 0), (0, -1))
            Line((0, -1), (9.424240018, -1))
            Line((9.424240018, -1), (9.424240018, 0))
        make_face()
    extrude(amount=5)
    with BuildSketch(Plane(origin=(-127.5, 0, 60), x_dir=(0, 0, 1), z_dir=(0, -1, 0))) as fillet3_piece_7:
        with BuildLine():
            CenterArc((FILLET3_R * 0.414213562373, FILLET3_R), FILLET3_R, 225, 45)
            Line((-FILLET3_R * 0.292893218813, FILLET3_R * 0.292893218813), (0, 0))
            Line((0, 0), (FILLET3_R * 0.414213562373, 0))
        make_face()
    extrude(amount=5)

    # Sketch11 → Cut-Extrude2 (cut, through all)
    with BuildSketch(Plane(origin=(0, 0, 0), x_dir=(1, 0, 0), z_dir=(0, 1, 0))):
        with BuildLine():
            Line((116.875, 49.75), (116.875, 53.5))
            ThreePointArc((116.875, 53.5), (117.607233047, 55.267766953), (119.375, 56))
            Line((119.375, 56), (134.375, 56))
            ThreePointArc((134.375, 56), (136.142766953, 55.267766953), (136.875, 53.5))
            Line((136.875, 53.5), (136.875, -53.5))
            ThreePointArc((136.875, -53.5), (136.142766953, -55.267766953), (134.375, -56))
            Line((134.375, -56), (119.375, -56))
            ThreePointArc((119.375, -56), (117.607233047, -55.267766953), (116.875, -53.5))
            Line((116.875, -53.5), (116.875, -49.75))
            ThreePointArc((116.875, -49.75), (116.142766953, -47.982233047), (114.375, -47.25))
            ThreePointArc((114.375, -47.25), (116.142766953, -46.517766953), (116.875, -44.75))
            Line((116.875, -44.75), (116.875, 44.75))
            ThreePointArc((116.875, 44.75), (116.142766953, 46.517766953), (114.375, 47.25))
            ThreePointArc((114.375, 47.25), (116.142766953, 47.982233047), (116.875, 49.75))
        make_face()
    extrude(amount=-CUT_EXTRUDE2_DEPTH, mode=Mode.SUBTRACT)


solid = part.part
